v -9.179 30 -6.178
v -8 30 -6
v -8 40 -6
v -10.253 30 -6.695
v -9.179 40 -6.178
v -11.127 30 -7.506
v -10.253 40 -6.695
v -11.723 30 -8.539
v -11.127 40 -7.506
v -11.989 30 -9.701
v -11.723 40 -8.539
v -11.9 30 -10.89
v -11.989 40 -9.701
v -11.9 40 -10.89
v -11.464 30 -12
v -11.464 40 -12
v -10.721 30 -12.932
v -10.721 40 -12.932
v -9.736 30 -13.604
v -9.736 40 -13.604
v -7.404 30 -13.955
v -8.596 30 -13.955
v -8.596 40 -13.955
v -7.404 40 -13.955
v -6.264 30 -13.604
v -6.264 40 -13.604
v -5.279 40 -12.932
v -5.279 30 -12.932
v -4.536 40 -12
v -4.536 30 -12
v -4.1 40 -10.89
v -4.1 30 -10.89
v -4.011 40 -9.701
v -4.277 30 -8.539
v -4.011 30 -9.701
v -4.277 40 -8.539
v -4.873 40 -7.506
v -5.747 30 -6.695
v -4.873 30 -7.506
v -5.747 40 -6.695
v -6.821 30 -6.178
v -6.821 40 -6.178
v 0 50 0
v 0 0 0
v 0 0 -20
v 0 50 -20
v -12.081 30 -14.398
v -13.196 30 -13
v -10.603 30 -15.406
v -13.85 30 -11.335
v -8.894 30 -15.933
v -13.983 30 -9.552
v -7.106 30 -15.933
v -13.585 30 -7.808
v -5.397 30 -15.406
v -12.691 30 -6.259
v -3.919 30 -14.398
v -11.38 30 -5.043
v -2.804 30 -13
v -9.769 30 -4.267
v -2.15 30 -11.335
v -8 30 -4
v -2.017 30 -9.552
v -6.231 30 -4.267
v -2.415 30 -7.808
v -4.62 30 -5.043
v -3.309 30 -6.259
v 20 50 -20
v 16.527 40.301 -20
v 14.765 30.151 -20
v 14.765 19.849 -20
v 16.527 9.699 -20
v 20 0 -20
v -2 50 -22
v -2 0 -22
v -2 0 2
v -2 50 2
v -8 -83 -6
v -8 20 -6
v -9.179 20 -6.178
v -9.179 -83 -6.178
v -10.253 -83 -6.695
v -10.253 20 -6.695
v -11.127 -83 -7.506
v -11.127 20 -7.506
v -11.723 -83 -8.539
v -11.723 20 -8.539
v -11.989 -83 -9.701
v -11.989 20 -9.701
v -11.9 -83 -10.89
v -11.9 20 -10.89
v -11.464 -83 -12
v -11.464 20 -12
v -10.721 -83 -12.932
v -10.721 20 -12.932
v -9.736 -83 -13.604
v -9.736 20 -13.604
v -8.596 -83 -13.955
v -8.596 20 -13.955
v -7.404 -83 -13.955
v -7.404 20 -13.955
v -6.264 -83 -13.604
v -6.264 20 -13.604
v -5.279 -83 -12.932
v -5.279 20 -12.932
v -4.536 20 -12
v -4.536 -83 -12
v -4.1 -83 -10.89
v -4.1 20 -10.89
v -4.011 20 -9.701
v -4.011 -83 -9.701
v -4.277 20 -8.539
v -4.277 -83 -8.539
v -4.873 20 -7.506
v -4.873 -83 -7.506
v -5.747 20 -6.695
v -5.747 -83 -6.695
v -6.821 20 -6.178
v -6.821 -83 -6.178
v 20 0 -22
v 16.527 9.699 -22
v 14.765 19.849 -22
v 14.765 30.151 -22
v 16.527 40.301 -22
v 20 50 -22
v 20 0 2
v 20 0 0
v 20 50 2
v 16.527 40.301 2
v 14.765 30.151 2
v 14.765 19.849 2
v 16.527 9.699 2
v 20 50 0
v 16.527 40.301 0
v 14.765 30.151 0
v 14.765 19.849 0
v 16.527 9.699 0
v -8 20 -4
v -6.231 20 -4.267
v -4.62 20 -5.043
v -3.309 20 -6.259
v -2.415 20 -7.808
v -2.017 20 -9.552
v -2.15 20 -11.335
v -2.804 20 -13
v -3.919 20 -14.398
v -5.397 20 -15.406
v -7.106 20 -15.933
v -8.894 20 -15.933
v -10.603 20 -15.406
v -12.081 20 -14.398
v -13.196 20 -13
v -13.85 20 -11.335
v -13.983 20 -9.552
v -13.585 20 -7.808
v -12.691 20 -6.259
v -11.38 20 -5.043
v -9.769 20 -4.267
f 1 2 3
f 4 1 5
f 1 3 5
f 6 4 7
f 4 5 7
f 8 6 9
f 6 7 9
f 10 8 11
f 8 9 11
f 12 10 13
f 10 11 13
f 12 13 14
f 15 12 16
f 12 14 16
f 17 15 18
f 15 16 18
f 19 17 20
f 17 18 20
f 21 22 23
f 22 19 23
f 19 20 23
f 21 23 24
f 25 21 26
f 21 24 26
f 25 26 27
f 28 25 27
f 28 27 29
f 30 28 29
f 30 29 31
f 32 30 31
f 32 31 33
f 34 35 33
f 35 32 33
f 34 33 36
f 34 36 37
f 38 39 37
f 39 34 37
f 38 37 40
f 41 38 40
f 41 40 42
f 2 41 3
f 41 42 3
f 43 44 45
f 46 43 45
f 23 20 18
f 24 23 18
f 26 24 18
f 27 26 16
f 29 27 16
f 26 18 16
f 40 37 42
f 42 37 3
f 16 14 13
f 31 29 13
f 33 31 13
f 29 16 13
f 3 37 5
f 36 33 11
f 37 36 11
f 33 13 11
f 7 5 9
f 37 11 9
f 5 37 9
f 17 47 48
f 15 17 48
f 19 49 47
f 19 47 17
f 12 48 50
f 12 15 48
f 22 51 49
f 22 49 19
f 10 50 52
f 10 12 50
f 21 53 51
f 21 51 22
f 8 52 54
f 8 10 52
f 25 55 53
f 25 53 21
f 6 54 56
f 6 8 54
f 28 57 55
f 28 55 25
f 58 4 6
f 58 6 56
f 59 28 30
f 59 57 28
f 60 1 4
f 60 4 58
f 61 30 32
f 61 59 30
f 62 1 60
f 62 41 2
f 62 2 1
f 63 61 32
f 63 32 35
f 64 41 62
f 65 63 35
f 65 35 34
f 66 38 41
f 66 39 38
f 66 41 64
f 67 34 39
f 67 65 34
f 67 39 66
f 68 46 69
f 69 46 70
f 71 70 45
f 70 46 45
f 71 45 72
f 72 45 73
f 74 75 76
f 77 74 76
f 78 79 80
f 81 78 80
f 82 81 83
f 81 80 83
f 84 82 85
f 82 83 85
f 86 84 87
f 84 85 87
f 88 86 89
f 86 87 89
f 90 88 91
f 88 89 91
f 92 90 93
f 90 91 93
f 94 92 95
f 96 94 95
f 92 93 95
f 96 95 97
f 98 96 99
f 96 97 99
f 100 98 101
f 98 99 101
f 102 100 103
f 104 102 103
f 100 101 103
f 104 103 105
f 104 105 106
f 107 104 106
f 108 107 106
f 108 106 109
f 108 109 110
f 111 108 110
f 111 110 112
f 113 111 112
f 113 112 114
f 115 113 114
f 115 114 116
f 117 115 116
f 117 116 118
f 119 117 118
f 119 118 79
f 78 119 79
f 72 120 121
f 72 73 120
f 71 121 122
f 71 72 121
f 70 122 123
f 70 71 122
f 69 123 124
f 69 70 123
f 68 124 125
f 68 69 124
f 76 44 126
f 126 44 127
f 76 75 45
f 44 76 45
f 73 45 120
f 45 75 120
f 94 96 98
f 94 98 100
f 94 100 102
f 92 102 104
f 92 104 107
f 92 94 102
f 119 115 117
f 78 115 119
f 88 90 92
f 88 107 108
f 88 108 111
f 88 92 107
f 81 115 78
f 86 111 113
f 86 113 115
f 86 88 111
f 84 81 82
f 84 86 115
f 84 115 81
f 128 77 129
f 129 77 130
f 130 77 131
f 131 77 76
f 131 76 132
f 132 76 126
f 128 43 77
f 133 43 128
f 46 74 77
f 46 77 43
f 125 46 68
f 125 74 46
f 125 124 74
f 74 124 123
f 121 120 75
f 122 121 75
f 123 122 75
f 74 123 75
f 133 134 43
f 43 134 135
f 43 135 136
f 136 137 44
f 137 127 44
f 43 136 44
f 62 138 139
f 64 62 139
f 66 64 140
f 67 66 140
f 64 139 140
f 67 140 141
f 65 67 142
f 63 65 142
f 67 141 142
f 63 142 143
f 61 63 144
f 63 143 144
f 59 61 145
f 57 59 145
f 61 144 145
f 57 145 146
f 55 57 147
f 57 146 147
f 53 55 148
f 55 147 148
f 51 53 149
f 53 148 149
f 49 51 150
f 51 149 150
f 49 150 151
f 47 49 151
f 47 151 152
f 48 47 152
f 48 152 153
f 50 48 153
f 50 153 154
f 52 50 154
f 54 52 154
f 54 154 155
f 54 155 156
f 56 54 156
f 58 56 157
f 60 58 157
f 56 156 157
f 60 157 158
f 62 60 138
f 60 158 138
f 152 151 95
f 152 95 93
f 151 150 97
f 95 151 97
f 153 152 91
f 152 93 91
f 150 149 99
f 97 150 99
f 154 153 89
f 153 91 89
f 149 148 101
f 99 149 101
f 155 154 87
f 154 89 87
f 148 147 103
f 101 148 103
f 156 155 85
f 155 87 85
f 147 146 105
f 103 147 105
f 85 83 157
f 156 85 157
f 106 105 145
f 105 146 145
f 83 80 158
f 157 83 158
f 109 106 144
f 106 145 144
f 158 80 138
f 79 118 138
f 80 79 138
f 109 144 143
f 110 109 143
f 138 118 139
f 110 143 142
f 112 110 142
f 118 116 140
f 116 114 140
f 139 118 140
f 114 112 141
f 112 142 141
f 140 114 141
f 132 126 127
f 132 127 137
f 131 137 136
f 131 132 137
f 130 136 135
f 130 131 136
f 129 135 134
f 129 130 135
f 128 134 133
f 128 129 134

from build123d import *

# Parameters (mm, degrees)
BOSS_EXTRUDE1_DEPTH     = 50
CUT_EXTRUDE1_DEPTH      = 59.957611892
CUT_EXTRUDE1_DEPTH_BACK = 59.957611892
SKETCH3_R               = 60
BOSS_EXTRUDE2_START     = -30
SKETCH4_R               = 6
SKETCH4_R_2             = 4
BOSS_EXTRUDE2_DEPTH     = 10
BOSS_EXTRUDE3_START     = -20
SKETCH5_R               = 4
BOSS_EXTRUDE3_DEPTH     = 123


with BuildPart() as part:
    # Sketch1 → Boss-Extrude1 (new body)
    with BuildSketch(Plane(origin=(0, 0, 0), x_dir=(1, 0, 0), z_dir=(0, 1, 0))):
        Polygon((0, 0), (0, 20), (20, 20), (20, 22), (-2, 22), (-2, -2), (20, -2), (20, 0), align=None)
    extrude(amount=BOSS_EXTRUDE1_DEPTH)

    # Sketch3 → Cut-Extrude1 (cut, two sides: drawn at the far end of the back side and taken through both)
    with BuildSketch(Plane(origin=(0, 0, -22), x_dir=(-1, 0, 0), z_dir=(0, 0, -1)).offset(-CUT_EXTRUDE1_DEPTH_BACK)):
        with Locations((-74.543560573, 25)):
            Circle(SKETCH3_R)
    extrude(amount=CUT_EXTRUDE1_DEPTH + CUT_EXTRUDE1_DEPTH_BACK, mode=Mode.SUBTRACT)


with BuildPart() as body_2:
    # Sketch4 → Boss-Extrude2 (new body)
    with BuildSketch(Plane(origin=(0, 50, 0), x_dir=(1, 0, 0), z_dir=(0, 1, 0)).offset(BOSS_EXTRUDE2_START)):
        with Locations(Location((-8, 10, 0), (0, 0, 270))):
            Circle(SKETCH4_R)
        with Locations(Location((-8, 10, 0), (0, 0, 270))):
            Circle(SKETCH4_R_2, mode=Mode.SUBTRACT)
    extrude(amount=BOSS_EXTRUDE2_DEPTH)

    # Sketch5 → Boss-Extrude3 (add)
    with BuildSketch(Plane.XZ.offset(-20).offset(BOSS_EXTRUDE3_START)):
        with Locations(Location((-8, -10, 0), (0, 0, 90))):
            Circle(SKETCH5_R)
    extrude(amount=BOSS_EXTRUDE3_DEPTH)


solid = Compound([part.part, body_2.part])
